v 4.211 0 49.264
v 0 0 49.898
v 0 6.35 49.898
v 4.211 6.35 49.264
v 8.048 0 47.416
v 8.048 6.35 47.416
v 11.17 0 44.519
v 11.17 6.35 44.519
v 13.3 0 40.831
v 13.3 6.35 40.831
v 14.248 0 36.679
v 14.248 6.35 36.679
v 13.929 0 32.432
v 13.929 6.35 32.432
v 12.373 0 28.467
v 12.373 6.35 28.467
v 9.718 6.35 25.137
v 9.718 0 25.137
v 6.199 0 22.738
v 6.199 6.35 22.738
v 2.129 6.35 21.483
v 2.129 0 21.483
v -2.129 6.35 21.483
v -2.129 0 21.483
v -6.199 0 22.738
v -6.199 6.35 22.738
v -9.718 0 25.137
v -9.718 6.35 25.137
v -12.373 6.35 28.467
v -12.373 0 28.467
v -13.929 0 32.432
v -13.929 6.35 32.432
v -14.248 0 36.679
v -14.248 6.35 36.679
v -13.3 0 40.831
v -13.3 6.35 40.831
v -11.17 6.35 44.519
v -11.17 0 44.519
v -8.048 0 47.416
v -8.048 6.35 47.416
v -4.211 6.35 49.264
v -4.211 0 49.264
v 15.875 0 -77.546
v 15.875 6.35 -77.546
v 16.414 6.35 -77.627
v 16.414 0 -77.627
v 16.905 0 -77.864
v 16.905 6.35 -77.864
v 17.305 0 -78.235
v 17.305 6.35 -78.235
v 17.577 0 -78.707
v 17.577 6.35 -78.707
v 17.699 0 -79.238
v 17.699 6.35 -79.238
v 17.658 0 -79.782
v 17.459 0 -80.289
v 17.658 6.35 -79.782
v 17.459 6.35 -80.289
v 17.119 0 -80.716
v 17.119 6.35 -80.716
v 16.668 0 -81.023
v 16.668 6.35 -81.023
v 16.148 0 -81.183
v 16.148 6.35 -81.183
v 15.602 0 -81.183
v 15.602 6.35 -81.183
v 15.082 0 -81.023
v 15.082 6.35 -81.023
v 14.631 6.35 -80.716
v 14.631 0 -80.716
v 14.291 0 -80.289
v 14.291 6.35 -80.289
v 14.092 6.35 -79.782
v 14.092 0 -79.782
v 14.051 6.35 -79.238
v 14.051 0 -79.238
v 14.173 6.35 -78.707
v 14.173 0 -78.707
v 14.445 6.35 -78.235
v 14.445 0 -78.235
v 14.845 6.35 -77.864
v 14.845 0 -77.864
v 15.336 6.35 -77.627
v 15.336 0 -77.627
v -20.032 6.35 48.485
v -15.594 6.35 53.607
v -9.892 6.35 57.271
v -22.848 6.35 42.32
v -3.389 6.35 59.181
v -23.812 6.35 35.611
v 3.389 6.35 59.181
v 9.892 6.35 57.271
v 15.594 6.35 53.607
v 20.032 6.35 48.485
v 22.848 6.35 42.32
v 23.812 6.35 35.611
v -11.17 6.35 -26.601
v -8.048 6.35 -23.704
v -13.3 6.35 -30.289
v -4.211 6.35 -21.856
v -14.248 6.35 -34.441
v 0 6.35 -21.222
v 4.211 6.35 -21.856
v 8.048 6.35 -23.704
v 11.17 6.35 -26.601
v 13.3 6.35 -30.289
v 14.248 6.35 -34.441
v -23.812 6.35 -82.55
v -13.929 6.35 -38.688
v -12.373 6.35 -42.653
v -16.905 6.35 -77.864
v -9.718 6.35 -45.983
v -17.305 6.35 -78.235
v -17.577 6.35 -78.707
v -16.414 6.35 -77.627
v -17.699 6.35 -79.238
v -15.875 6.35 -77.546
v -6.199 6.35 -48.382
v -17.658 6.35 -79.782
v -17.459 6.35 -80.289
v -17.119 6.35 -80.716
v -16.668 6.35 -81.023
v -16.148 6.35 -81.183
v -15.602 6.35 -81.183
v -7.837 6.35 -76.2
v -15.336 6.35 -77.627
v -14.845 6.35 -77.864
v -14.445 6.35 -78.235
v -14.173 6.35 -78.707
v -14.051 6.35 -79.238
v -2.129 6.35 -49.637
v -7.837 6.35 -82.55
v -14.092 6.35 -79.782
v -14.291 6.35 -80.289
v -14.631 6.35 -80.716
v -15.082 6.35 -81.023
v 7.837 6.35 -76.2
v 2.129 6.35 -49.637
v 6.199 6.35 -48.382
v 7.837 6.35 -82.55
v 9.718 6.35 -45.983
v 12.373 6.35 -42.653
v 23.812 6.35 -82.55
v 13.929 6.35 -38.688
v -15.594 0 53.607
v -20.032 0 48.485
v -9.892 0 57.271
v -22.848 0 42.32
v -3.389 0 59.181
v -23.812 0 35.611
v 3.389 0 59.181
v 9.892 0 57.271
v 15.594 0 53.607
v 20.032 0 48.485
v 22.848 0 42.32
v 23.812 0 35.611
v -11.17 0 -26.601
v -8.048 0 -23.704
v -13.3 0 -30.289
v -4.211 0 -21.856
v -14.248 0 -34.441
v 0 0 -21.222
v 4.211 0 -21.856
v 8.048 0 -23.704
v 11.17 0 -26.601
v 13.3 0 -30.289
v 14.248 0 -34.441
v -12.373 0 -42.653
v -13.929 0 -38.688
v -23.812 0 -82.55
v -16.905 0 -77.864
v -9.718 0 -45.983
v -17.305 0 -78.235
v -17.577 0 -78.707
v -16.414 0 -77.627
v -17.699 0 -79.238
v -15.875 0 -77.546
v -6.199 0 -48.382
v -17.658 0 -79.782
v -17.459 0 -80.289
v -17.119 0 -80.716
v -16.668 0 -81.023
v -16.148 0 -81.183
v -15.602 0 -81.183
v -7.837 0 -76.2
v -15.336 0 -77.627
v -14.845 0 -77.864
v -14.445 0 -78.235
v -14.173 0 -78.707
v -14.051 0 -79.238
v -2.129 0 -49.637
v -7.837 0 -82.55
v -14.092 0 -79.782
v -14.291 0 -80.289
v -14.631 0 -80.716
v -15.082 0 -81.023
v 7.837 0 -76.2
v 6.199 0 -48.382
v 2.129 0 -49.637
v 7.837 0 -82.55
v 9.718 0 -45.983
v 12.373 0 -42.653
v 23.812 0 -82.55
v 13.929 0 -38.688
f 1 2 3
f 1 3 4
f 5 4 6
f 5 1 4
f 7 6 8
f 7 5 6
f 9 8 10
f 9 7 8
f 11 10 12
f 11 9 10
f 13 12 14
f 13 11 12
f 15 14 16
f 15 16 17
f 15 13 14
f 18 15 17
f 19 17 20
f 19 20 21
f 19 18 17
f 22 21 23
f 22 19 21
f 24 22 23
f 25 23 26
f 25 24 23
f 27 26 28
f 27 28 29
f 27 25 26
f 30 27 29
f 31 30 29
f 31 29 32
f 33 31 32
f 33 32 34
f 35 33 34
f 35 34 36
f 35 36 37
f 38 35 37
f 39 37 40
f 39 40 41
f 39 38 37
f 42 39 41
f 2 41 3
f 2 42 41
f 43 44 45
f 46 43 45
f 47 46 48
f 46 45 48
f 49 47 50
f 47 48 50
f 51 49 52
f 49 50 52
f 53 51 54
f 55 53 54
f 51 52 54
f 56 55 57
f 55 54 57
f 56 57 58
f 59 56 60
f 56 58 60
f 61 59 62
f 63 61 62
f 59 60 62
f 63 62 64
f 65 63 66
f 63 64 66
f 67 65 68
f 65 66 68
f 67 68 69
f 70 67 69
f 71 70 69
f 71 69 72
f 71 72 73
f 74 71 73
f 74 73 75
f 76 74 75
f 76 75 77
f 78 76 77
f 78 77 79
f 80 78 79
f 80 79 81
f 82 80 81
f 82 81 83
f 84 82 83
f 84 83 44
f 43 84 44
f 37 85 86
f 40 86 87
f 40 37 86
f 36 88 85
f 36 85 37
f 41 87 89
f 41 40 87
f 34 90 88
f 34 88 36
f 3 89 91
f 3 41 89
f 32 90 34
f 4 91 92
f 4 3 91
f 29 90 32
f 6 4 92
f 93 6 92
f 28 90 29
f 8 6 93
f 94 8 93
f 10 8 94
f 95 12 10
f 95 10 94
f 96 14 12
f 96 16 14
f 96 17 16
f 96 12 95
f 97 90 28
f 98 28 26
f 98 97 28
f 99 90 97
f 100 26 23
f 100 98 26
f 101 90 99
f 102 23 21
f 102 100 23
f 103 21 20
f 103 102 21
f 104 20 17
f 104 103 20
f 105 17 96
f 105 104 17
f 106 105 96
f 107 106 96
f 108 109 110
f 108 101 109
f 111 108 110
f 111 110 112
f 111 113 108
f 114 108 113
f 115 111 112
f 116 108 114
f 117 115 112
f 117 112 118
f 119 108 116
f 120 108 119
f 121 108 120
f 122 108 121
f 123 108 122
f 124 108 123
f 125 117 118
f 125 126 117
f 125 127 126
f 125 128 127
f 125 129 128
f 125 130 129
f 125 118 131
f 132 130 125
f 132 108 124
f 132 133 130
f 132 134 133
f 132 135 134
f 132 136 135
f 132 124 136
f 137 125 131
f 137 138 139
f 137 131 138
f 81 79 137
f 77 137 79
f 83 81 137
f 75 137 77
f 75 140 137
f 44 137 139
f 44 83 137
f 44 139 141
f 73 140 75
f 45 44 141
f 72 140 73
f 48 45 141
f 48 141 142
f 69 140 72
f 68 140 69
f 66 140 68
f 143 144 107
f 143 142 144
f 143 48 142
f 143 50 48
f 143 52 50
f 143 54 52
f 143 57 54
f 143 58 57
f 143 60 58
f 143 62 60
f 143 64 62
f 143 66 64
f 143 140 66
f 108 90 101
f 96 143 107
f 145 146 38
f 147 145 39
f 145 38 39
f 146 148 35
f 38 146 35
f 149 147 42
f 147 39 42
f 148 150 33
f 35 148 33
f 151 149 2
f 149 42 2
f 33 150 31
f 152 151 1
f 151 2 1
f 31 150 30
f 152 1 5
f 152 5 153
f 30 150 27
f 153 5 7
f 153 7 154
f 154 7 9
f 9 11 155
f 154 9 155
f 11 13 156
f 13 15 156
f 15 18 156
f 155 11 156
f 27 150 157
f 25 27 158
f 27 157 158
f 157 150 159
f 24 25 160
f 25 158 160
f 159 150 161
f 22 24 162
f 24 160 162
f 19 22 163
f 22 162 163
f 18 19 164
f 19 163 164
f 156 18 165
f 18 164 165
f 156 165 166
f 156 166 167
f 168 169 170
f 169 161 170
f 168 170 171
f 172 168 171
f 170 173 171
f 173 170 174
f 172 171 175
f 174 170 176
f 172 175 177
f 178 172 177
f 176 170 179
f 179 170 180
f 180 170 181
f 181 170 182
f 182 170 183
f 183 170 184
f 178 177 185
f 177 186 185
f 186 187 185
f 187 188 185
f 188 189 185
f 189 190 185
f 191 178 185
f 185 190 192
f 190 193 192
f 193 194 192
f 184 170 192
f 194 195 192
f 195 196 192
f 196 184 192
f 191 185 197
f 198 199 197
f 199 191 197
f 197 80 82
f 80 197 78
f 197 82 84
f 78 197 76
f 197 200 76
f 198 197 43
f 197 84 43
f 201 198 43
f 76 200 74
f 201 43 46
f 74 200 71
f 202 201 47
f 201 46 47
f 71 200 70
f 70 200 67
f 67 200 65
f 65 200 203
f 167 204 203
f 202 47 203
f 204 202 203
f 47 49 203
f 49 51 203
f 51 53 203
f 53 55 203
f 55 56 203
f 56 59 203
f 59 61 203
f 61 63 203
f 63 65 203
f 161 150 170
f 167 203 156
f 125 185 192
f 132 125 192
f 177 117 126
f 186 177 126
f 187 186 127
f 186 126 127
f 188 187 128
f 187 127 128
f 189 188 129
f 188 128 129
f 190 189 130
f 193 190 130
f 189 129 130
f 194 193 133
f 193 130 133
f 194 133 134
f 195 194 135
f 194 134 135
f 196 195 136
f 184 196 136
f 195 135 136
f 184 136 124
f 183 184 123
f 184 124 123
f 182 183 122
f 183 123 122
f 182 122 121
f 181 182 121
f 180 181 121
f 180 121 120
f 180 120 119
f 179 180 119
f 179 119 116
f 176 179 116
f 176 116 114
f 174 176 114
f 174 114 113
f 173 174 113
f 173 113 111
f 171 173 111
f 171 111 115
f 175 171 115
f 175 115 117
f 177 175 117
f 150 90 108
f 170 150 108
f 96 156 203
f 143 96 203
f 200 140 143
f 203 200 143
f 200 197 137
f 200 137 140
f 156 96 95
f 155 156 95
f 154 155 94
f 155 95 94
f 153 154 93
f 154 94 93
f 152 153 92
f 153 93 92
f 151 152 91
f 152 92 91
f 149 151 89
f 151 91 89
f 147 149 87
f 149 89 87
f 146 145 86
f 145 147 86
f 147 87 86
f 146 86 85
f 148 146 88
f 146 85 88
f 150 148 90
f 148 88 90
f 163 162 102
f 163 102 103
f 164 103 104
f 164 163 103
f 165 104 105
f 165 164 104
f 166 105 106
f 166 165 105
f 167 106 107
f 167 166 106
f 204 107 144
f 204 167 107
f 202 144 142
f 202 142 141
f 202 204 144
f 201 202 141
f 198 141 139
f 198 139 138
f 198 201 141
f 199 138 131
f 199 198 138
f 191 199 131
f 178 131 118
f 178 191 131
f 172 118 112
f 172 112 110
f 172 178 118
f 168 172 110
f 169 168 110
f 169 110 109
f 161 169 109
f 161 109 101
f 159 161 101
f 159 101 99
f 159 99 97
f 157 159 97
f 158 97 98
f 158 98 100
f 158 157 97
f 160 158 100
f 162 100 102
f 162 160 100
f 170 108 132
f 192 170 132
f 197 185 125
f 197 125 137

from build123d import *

# Parameters (mm, degrees)
SKETCH1_W           = 47.625
SKETCH1_H           = 152.4
SKETCH1_R           = 14.2875
BOSS_EXTRUDE1_DEPTH = 6.35
CUT_EXTRUDE1_DEPTH  = 81.086188923
SKETCH3_W           = 15.975
SKETCH3_H           = 6.35
BOSS_EXTRUDE2_DEPTH = 6.35
SKETCH4_R           = 1.8288
CUT_EXTRUDE2_DEPTH  = 87.15021855


with BuildPart() as part:
    # Sketch1 → Boss-Extrude1 (new body)
    with BuildSketch(Plane(origin=(0, 0, 0), x_dir=(1, 0, 0), z_dir=(0, 1, 0))):
        Rectangle(SKETCH1_W, SKETCH1_H)
        with Locations(Location((0, 35.5092, 0), (0, 0, 270))):
            Circle(SKETCH1_R, mode=Mode.SUBTRACT)
        with Locations(Location((0, -35.6108, 0), (0, 0, 270))):
            Circle(SKETCH1_R, mode=Mode.SUBTRACT)
    extrude(amount=BOSS_EXTRUDE1_DEPTH)

    # Sketch2 → Cut-Extrude1 (cut, through all)
    with BuildSketch(Plane(origin=(0, 6.35, 0), x_dir=(1, 0, 0), z_dir=(0, 1, 0))):
        with BuildLine():
            ThreePointArc((23.8125, -35.6108), (0, -59.4233), (-23.8125, -35.6108))
            Line((-23.8125, -35.6108), (-23.8125, -76.2))
            Line((-23.8125, -76.2), (23.8125, -76.2))
            Line((23.8125, -76.2), (23.8125, -35.6108))
        make_face()
    extrude(amount=-CUT_EXTRUDE1_DEPTH, mode=Mode.SUBTRACT)

    # Sketch3 → Boss-Extrude2 (add)
    with BuildSketch(Plane(origin=(0, 6.35, 0), x_dir=(1, 0, 0), z_dir=(0, 1, 0))):
        with Locations((-15.825, 79.375)):
            Rectangle(SKETCH3_W, SKETCH3_H)
        with Locations((15.825, 79.375)):
            Rectangle(SKETCH3_W, SKETCH3_H)
    extrude(amount=-BOSS_EXTRUDE2_DEPTH)

    # Sketch4 → Cut-Extrude2 (cut, through all)
    with BuildSketch(Plane(origin=(0, 6.35, 0), x_dir=(1, 0, 0), z_dir=(0, 1, 0))):
        with Locations(Location((-15.875, 79.375, 0), (0, 0, 270))):
            Circle(SKETCH4_R)
        with Locations(Location((15.875, 79.375, 0), (0, 0, 270))):
            Circle(SKETCH4_R)
    extrude(amount=-CUT_EXTRUDE2_DEPTH, mode=Mode.SUBTRACT)


solid = part.part
